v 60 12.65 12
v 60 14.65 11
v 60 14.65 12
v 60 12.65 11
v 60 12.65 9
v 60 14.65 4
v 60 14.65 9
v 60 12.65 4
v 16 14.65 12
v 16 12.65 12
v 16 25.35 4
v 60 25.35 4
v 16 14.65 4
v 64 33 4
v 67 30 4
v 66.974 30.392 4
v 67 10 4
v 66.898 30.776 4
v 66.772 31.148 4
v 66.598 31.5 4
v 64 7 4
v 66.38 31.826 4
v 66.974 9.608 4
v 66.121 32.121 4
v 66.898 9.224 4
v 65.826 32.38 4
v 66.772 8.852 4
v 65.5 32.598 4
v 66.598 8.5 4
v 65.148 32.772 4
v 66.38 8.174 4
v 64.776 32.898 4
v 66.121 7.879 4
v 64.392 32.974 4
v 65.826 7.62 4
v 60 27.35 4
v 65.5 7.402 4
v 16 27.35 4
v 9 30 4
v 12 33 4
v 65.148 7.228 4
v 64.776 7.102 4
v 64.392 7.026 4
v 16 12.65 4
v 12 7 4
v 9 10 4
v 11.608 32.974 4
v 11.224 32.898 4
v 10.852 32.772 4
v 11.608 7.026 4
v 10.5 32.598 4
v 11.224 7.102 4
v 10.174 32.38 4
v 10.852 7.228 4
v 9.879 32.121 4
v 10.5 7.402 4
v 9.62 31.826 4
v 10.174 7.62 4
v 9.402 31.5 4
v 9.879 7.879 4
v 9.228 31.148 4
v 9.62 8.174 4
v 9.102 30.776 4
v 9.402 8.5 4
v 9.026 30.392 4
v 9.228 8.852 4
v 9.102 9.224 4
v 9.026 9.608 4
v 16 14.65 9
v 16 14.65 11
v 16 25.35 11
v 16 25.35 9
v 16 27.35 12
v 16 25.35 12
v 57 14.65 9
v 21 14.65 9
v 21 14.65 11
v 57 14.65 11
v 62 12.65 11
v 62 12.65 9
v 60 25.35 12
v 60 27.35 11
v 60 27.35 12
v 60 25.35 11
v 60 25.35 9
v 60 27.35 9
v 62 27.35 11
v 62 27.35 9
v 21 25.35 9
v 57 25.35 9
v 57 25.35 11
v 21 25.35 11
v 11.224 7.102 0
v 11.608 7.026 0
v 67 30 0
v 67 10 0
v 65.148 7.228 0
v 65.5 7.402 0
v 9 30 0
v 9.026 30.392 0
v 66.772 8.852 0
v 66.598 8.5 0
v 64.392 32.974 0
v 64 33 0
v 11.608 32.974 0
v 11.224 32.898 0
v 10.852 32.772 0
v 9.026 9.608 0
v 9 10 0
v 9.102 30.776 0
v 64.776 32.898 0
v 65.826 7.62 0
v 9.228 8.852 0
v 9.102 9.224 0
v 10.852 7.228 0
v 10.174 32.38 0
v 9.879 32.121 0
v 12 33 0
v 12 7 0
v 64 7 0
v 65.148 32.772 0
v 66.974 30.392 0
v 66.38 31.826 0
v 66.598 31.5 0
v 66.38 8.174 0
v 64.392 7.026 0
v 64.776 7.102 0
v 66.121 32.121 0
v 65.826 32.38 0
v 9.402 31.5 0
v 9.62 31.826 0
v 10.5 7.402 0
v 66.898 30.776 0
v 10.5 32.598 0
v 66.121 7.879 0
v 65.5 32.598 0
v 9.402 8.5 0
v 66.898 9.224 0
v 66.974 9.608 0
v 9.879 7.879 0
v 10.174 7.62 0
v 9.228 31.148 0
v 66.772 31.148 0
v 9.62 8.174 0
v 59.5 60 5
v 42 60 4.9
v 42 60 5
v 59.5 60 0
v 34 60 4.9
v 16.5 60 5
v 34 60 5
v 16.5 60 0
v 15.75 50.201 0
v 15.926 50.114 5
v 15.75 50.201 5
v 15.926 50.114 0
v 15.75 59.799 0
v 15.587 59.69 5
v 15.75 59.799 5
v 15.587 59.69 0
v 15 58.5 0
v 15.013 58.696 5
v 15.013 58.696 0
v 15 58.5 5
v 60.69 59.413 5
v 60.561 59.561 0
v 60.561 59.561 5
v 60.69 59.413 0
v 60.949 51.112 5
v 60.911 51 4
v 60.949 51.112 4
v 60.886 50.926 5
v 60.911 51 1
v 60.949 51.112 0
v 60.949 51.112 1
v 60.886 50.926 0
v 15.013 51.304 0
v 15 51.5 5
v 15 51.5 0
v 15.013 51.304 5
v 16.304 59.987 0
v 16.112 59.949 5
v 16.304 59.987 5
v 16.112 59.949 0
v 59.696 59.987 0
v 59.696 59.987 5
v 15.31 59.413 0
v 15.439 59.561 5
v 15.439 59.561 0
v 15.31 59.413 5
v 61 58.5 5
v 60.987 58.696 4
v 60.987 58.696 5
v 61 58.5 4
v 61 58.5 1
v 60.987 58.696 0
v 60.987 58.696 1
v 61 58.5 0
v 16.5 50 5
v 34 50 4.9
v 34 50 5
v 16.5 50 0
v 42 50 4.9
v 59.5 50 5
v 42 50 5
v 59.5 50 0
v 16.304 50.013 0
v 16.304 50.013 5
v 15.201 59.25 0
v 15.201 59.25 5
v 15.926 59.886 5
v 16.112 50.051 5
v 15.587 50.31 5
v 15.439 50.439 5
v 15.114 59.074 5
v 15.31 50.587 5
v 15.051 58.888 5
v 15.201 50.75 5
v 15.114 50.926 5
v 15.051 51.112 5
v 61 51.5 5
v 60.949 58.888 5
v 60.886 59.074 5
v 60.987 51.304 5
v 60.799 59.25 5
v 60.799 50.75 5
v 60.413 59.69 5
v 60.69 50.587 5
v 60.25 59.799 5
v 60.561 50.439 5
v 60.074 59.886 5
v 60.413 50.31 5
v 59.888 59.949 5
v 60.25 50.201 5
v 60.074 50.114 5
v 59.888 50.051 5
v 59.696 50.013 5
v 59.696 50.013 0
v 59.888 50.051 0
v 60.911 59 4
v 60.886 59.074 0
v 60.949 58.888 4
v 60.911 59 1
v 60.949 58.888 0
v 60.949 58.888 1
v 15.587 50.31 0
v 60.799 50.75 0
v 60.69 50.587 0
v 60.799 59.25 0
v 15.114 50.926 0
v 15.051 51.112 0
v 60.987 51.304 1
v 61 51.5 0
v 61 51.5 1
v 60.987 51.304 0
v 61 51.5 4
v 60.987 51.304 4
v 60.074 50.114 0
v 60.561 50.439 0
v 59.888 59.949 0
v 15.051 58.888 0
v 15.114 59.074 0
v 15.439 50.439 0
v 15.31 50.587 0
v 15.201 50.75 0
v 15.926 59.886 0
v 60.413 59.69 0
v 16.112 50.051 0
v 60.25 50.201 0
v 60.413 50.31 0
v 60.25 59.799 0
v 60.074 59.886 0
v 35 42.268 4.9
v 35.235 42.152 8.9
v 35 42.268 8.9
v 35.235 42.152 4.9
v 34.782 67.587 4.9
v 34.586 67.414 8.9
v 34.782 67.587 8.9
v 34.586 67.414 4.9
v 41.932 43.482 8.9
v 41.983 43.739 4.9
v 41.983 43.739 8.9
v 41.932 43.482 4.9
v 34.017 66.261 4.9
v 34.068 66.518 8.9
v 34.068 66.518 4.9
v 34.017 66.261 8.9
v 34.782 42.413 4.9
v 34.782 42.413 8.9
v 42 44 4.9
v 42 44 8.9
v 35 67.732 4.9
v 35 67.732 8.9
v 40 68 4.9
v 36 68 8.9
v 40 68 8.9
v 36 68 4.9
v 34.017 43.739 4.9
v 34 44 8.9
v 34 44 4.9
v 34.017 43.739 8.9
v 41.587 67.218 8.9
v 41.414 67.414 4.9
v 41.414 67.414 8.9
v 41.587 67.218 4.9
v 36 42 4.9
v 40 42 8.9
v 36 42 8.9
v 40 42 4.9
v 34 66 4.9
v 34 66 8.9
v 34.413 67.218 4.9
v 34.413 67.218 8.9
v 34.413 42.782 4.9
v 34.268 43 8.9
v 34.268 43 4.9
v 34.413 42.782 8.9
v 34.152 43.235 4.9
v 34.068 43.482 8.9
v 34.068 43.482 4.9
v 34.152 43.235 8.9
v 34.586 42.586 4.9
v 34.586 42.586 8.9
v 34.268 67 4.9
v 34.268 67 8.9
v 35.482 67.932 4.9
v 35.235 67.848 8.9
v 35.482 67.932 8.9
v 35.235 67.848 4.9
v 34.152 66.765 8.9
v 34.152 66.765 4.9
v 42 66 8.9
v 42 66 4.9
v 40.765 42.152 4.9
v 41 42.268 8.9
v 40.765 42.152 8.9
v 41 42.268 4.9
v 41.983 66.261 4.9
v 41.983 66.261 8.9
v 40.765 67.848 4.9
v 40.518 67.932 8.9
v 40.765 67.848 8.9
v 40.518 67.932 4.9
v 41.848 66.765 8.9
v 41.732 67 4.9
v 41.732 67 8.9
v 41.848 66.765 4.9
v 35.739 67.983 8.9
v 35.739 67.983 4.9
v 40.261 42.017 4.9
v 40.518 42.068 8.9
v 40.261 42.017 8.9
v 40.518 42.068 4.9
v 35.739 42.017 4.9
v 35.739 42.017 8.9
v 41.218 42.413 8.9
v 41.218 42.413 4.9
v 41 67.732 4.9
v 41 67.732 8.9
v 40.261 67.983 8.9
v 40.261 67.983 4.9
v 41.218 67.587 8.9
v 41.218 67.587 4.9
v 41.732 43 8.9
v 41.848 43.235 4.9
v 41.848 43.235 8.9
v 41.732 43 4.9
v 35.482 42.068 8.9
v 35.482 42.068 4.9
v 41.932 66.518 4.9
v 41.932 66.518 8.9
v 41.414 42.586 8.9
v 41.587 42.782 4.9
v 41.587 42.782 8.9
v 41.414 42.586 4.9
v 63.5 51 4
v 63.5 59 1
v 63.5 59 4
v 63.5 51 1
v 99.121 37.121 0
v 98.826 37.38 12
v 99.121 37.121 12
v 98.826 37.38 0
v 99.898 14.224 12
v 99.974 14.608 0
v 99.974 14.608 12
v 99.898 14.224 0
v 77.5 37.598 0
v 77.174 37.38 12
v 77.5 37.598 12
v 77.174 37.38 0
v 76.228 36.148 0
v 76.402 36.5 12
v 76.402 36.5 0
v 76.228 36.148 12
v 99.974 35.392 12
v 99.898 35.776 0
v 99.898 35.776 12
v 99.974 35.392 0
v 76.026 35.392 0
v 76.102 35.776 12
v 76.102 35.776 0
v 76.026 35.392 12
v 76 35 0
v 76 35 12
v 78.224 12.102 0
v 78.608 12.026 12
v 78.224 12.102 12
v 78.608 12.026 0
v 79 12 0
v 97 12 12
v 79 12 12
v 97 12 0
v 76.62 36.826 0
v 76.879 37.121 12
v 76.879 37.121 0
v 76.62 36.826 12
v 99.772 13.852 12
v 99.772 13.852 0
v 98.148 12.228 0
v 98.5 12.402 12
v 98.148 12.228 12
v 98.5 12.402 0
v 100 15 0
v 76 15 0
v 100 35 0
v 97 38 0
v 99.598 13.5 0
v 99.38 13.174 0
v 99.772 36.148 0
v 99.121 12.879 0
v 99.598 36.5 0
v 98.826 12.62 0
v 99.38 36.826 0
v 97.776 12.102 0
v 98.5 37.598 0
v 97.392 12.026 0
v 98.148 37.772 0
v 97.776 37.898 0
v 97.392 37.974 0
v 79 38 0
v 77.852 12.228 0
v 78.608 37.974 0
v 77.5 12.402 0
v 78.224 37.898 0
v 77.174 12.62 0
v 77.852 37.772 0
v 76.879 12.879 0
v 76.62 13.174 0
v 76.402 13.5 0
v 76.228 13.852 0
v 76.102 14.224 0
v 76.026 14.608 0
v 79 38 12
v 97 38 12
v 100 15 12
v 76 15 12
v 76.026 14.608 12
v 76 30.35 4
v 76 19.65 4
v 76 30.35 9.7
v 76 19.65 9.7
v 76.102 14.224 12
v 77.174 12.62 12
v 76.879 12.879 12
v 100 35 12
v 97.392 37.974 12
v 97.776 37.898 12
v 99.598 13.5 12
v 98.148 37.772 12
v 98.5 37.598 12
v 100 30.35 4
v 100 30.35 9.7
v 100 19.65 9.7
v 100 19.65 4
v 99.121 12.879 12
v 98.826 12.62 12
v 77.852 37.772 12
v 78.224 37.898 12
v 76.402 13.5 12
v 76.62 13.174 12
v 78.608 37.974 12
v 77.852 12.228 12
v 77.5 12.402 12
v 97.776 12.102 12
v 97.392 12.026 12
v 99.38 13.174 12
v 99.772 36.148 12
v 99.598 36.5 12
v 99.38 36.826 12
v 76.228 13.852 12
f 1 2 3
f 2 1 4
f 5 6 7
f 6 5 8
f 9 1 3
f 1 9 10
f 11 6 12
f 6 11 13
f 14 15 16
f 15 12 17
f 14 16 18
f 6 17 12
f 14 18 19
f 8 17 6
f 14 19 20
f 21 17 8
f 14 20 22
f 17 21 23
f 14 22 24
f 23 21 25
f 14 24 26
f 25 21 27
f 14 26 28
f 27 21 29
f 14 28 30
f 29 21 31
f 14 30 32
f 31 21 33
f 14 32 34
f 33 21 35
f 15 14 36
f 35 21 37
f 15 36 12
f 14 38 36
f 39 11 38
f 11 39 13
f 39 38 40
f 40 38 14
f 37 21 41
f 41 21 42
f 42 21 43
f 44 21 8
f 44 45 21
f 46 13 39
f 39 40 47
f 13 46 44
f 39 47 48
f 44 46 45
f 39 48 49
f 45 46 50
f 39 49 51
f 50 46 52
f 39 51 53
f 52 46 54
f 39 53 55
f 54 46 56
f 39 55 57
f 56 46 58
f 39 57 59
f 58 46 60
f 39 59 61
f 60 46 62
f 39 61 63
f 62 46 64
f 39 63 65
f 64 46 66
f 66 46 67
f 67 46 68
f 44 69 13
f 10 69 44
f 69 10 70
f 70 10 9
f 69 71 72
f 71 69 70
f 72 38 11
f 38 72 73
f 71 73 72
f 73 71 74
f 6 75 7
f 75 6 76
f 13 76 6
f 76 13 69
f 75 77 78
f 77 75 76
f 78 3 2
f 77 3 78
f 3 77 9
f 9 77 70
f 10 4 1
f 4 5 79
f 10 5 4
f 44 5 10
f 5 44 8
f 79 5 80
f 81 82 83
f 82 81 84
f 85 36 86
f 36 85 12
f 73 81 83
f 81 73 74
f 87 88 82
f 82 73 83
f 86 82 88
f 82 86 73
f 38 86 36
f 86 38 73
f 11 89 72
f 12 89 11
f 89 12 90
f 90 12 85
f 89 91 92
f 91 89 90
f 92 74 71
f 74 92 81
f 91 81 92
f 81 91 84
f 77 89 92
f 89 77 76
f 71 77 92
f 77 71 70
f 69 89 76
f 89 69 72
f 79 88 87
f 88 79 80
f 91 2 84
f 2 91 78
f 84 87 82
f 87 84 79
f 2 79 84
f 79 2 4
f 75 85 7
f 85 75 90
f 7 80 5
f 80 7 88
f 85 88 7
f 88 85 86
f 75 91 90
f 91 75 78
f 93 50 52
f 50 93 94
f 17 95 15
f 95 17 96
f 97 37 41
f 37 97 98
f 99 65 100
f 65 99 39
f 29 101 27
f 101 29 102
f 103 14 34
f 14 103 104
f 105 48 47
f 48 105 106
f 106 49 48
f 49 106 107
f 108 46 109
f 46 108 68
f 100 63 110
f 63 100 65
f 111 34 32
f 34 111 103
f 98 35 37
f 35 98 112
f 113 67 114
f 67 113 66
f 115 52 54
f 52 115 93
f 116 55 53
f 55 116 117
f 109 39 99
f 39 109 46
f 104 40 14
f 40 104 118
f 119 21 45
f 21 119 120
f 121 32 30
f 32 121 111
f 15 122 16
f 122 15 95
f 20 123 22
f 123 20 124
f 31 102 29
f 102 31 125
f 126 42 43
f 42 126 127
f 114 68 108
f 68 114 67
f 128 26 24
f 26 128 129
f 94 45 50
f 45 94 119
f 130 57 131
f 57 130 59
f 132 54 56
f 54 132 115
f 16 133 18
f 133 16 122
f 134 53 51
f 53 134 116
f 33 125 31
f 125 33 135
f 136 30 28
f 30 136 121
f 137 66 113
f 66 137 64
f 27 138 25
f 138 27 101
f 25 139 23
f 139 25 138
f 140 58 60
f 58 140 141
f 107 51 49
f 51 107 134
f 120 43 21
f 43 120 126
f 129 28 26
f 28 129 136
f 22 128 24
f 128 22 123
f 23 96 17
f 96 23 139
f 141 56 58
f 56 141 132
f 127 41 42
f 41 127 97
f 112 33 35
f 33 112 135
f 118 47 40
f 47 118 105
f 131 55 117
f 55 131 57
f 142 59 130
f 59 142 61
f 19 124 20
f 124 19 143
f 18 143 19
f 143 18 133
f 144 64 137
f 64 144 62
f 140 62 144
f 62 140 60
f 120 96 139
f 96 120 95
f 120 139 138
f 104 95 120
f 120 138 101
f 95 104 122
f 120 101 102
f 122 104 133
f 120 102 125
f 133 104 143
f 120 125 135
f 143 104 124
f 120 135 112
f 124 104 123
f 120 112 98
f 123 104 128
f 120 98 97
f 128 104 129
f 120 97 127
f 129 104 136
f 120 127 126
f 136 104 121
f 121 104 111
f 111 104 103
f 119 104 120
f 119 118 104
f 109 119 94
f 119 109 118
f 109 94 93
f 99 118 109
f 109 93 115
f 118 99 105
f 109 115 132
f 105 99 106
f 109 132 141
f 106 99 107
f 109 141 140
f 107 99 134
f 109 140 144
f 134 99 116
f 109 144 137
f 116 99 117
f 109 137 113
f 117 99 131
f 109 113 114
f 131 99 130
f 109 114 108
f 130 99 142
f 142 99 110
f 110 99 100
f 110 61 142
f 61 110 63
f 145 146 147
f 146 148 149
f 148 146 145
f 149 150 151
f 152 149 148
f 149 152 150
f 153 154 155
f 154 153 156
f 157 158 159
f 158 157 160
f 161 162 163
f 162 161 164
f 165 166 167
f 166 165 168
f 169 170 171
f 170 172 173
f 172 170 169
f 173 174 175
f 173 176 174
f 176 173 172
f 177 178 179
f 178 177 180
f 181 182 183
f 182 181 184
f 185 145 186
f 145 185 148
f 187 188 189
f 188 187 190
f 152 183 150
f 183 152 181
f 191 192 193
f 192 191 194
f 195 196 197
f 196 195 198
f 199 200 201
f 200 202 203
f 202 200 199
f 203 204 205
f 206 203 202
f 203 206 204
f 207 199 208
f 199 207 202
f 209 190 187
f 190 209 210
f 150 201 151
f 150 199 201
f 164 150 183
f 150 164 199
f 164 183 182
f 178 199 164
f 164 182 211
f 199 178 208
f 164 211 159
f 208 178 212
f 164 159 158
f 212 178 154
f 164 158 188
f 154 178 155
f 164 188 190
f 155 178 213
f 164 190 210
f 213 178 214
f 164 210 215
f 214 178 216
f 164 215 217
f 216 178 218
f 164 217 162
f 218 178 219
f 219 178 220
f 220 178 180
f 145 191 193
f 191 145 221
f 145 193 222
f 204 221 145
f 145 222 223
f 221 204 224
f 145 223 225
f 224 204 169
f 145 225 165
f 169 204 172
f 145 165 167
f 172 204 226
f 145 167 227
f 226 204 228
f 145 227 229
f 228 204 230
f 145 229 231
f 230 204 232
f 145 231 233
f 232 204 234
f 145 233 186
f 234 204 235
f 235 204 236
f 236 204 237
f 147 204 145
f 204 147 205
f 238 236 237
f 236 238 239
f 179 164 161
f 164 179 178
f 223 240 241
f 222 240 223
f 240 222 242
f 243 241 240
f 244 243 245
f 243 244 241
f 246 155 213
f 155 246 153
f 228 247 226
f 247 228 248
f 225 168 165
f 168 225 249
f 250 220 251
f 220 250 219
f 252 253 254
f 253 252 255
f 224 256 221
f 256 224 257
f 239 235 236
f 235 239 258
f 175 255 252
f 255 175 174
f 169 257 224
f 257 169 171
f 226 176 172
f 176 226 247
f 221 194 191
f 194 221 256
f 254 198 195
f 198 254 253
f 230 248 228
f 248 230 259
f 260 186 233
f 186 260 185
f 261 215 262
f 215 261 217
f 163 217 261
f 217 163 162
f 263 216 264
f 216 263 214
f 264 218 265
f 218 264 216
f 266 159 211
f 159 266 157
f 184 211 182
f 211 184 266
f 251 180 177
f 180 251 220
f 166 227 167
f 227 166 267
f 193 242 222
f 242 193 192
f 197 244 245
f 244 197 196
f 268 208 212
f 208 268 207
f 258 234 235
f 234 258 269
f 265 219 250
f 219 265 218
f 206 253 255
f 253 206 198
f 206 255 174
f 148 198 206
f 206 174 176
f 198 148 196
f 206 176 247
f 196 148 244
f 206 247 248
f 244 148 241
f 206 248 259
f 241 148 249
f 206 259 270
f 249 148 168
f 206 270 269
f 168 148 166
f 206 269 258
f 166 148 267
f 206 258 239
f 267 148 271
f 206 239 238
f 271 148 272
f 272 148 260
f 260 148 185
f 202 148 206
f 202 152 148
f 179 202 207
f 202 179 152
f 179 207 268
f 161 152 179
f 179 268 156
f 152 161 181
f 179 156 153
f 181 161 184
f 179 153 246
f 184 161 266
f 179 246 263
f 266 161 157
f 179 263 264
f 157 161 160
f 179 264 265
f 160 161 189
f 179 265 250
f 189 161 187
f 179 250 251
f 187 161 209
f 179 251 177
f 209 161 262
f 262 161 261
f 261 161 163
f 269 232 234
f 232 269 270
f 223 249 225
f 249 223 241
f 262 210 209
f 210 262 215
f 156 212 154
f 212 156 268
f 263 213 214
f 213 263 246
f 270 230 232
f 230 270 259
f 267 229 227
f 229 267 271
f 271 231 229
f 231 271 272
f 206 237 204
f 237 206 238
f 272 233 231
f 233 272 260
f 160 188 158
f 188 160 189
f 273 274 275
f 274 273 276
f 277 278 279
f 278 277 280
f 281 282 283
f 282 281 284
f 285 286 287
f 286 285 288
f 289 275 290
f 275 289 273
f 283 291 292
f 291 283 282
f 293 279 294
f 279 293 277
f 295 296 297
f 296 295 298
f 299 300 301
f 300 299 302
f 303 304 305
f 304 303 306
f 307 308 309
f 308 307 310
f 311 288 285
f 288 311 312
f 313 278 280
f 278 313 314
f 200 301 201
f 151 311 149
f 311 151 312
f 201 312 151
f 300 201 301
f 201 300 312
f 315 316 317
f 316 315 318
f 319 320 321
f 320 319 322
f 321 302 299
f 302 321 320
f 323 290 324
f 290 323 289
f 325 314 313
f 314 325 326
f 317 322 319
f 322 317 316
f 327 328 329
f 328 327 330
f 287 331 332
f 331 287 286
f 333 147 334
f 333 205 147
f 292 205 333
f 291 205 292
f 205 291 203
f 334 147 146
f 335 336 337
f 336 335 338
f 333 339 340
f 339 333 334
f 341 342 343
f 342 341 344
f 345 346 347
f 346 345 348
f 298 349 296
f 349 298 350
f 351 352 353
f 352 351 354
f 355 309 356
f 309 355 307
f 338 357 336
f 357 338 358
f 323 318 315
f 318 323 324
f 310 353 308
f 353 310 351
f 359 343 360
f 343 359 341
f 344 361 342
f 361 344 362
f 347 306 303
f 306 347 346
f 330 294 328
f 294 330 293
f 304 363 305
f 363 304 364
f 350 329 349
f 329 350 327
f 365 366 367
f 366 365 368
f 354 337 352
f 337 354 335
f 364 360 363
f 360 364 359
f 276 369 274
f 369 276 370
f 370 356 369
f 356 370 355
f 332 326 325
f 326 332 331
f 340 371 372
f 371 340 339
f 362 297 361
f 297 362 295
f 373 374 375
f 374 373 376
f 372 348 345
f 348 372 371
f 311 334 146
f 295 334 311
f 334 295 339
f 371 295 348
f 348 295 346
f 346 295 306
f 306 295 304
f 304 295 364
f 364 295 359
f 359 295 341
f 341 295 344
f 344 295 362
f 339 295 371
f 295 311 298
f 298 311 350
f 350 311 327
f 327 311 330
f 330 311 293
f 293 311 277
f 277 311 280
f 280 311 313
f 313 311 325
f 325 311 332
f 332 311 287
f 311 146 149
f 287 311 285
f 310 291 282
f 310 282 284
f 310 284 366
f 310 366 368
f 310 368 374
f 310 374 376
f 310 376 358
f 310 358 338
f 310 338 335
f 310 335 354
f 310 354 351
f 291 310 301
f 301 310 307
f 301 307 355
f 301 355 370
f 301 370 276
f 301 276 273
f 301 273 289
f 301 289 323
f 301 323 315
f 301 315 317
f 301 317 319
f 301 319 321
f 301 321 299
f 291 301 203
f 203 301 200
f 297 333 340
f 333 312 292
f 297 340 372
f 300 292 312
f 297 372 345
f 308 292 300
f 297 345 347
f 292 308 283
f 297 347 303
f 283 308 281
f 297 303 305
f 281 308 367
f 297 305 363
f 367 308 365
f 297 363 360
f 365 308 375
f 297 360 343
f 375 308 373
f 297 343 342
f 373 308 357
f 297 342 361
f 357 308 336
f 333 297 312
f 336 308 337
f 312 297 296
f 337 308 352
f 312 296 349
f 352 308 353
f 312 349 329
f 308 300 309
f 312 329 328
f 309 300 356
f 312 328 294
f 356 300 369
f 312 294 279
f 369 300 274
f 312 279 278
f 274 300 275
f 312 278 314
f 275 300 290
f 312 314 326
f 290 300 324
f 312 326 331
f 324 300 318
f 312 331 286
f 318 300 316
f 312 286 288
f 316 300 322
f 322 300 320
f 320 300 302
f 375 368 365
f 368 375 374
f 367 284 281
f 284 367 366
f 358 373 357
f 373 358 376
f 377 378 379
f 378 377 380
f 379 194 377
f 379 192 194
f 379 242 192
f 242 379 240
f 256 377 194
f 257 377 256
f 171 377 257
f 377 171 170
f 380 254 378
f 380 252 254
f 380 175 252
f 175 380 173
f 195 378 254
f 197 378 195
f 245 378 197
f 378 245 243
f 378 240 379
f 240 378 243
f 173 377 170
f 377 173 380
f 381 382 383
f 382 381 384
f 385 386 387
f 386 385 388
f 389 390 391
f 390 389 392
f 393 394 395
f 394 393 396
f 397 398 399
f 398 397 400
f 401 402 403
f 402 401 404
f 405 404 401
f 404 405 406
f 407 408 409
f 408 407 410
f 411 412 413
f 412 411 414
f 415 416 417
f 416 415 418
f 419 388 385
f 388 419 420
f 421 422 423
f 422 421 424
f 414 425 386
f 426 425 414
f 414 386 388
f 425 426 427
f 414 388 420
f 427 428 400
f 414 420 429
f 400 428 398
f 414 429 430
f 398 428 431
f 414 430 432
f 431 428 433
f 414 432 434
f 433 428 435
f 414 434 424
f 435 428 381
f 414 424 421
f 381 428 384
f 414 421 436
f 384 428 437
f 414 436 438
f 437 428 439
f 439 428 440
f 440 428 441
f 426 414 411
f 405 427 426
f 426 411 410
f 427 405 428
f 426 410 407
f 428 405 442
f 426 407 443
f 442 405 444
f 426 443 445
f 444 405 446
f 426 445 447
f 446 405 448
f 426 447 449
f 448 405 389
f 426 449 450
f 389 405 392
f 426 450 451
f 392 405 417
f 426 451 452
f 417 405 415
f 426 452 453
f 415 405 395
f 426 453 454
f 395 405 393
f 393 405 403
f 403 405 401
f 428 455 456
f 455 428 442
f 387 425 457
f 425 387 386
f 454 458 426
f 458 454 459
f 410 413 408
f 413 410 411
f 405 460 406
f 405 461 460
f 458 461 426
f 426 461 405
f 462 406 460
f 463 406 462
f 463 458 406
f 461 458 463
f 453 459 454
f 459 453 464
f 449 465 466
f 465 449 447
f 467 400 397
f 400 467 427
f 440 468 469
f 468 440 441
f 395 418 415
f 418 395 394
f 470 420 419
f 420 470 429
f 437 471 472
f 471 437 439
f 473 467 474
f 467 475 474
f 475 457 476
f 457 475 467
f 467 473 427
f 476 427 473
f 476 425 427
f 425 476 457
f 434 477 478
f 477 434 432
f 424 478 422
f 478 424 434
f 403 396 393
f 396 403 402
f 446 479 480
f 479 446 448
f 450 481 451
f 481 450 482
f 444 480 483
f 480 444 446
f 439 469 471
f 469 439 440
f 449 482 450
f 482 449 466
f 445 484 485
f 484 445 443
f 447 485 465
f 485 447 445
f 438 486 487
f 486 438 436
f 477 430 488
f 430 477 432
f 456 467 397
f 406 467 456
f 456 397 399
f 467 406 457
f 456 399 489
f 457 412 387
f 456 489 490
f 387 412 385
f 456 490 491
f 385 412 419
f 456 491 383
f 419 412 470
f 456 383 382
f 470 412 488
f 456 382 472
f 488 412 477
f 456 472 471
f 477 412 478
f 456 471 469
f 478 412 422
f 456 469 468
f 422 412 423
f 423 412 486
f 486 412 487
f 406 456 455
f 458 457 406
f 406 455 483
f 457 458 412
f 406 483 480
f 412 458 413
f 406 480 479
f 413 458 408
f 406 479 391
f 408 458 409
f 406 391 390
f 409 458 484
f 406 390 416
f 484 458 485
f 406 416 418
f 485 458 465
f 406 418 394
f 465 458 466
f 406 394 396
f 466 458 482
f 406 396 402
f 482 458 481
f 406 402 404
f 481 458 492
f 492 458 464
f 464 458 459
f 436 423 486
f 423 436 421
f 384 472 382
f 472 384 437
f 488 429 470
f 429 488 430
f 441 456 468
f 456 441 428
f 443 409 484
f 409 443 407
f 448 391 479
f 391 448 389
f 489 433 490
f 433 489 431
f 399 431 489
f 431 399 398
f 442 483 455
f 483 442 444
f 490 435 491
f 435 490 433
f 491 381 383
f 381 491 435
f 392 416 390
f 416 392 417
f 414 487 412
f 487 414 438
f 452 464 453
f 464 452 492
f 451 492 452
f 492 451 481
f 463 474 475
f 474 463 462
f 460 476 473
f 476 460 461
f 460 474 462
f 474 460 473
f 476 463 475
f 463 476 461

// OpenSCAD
/*
Sample 083: Linearer Schubriegel — 0,35 mm
Generated from the FDM Mechanical Sample Library.
Units: millimetres.

Override examples:
  openscad -o custom.stl -D 'view="plate"' -D 'render_fn=64' model.scad
  openscad -o preview.png -D 'view="assembly"' model.scad
*/
use <../../../library/fdm_mechanisms.scad>

render_fn = is_undef(render_fn) ? 48 : render_fn;
view = is_undef(view) ? "plate" : view;
$fn = render_fn;

sample_slide_bolt(
    view=view,
    clearance=0.35,
    bolt_w=10,
    bolt_h=5
);
